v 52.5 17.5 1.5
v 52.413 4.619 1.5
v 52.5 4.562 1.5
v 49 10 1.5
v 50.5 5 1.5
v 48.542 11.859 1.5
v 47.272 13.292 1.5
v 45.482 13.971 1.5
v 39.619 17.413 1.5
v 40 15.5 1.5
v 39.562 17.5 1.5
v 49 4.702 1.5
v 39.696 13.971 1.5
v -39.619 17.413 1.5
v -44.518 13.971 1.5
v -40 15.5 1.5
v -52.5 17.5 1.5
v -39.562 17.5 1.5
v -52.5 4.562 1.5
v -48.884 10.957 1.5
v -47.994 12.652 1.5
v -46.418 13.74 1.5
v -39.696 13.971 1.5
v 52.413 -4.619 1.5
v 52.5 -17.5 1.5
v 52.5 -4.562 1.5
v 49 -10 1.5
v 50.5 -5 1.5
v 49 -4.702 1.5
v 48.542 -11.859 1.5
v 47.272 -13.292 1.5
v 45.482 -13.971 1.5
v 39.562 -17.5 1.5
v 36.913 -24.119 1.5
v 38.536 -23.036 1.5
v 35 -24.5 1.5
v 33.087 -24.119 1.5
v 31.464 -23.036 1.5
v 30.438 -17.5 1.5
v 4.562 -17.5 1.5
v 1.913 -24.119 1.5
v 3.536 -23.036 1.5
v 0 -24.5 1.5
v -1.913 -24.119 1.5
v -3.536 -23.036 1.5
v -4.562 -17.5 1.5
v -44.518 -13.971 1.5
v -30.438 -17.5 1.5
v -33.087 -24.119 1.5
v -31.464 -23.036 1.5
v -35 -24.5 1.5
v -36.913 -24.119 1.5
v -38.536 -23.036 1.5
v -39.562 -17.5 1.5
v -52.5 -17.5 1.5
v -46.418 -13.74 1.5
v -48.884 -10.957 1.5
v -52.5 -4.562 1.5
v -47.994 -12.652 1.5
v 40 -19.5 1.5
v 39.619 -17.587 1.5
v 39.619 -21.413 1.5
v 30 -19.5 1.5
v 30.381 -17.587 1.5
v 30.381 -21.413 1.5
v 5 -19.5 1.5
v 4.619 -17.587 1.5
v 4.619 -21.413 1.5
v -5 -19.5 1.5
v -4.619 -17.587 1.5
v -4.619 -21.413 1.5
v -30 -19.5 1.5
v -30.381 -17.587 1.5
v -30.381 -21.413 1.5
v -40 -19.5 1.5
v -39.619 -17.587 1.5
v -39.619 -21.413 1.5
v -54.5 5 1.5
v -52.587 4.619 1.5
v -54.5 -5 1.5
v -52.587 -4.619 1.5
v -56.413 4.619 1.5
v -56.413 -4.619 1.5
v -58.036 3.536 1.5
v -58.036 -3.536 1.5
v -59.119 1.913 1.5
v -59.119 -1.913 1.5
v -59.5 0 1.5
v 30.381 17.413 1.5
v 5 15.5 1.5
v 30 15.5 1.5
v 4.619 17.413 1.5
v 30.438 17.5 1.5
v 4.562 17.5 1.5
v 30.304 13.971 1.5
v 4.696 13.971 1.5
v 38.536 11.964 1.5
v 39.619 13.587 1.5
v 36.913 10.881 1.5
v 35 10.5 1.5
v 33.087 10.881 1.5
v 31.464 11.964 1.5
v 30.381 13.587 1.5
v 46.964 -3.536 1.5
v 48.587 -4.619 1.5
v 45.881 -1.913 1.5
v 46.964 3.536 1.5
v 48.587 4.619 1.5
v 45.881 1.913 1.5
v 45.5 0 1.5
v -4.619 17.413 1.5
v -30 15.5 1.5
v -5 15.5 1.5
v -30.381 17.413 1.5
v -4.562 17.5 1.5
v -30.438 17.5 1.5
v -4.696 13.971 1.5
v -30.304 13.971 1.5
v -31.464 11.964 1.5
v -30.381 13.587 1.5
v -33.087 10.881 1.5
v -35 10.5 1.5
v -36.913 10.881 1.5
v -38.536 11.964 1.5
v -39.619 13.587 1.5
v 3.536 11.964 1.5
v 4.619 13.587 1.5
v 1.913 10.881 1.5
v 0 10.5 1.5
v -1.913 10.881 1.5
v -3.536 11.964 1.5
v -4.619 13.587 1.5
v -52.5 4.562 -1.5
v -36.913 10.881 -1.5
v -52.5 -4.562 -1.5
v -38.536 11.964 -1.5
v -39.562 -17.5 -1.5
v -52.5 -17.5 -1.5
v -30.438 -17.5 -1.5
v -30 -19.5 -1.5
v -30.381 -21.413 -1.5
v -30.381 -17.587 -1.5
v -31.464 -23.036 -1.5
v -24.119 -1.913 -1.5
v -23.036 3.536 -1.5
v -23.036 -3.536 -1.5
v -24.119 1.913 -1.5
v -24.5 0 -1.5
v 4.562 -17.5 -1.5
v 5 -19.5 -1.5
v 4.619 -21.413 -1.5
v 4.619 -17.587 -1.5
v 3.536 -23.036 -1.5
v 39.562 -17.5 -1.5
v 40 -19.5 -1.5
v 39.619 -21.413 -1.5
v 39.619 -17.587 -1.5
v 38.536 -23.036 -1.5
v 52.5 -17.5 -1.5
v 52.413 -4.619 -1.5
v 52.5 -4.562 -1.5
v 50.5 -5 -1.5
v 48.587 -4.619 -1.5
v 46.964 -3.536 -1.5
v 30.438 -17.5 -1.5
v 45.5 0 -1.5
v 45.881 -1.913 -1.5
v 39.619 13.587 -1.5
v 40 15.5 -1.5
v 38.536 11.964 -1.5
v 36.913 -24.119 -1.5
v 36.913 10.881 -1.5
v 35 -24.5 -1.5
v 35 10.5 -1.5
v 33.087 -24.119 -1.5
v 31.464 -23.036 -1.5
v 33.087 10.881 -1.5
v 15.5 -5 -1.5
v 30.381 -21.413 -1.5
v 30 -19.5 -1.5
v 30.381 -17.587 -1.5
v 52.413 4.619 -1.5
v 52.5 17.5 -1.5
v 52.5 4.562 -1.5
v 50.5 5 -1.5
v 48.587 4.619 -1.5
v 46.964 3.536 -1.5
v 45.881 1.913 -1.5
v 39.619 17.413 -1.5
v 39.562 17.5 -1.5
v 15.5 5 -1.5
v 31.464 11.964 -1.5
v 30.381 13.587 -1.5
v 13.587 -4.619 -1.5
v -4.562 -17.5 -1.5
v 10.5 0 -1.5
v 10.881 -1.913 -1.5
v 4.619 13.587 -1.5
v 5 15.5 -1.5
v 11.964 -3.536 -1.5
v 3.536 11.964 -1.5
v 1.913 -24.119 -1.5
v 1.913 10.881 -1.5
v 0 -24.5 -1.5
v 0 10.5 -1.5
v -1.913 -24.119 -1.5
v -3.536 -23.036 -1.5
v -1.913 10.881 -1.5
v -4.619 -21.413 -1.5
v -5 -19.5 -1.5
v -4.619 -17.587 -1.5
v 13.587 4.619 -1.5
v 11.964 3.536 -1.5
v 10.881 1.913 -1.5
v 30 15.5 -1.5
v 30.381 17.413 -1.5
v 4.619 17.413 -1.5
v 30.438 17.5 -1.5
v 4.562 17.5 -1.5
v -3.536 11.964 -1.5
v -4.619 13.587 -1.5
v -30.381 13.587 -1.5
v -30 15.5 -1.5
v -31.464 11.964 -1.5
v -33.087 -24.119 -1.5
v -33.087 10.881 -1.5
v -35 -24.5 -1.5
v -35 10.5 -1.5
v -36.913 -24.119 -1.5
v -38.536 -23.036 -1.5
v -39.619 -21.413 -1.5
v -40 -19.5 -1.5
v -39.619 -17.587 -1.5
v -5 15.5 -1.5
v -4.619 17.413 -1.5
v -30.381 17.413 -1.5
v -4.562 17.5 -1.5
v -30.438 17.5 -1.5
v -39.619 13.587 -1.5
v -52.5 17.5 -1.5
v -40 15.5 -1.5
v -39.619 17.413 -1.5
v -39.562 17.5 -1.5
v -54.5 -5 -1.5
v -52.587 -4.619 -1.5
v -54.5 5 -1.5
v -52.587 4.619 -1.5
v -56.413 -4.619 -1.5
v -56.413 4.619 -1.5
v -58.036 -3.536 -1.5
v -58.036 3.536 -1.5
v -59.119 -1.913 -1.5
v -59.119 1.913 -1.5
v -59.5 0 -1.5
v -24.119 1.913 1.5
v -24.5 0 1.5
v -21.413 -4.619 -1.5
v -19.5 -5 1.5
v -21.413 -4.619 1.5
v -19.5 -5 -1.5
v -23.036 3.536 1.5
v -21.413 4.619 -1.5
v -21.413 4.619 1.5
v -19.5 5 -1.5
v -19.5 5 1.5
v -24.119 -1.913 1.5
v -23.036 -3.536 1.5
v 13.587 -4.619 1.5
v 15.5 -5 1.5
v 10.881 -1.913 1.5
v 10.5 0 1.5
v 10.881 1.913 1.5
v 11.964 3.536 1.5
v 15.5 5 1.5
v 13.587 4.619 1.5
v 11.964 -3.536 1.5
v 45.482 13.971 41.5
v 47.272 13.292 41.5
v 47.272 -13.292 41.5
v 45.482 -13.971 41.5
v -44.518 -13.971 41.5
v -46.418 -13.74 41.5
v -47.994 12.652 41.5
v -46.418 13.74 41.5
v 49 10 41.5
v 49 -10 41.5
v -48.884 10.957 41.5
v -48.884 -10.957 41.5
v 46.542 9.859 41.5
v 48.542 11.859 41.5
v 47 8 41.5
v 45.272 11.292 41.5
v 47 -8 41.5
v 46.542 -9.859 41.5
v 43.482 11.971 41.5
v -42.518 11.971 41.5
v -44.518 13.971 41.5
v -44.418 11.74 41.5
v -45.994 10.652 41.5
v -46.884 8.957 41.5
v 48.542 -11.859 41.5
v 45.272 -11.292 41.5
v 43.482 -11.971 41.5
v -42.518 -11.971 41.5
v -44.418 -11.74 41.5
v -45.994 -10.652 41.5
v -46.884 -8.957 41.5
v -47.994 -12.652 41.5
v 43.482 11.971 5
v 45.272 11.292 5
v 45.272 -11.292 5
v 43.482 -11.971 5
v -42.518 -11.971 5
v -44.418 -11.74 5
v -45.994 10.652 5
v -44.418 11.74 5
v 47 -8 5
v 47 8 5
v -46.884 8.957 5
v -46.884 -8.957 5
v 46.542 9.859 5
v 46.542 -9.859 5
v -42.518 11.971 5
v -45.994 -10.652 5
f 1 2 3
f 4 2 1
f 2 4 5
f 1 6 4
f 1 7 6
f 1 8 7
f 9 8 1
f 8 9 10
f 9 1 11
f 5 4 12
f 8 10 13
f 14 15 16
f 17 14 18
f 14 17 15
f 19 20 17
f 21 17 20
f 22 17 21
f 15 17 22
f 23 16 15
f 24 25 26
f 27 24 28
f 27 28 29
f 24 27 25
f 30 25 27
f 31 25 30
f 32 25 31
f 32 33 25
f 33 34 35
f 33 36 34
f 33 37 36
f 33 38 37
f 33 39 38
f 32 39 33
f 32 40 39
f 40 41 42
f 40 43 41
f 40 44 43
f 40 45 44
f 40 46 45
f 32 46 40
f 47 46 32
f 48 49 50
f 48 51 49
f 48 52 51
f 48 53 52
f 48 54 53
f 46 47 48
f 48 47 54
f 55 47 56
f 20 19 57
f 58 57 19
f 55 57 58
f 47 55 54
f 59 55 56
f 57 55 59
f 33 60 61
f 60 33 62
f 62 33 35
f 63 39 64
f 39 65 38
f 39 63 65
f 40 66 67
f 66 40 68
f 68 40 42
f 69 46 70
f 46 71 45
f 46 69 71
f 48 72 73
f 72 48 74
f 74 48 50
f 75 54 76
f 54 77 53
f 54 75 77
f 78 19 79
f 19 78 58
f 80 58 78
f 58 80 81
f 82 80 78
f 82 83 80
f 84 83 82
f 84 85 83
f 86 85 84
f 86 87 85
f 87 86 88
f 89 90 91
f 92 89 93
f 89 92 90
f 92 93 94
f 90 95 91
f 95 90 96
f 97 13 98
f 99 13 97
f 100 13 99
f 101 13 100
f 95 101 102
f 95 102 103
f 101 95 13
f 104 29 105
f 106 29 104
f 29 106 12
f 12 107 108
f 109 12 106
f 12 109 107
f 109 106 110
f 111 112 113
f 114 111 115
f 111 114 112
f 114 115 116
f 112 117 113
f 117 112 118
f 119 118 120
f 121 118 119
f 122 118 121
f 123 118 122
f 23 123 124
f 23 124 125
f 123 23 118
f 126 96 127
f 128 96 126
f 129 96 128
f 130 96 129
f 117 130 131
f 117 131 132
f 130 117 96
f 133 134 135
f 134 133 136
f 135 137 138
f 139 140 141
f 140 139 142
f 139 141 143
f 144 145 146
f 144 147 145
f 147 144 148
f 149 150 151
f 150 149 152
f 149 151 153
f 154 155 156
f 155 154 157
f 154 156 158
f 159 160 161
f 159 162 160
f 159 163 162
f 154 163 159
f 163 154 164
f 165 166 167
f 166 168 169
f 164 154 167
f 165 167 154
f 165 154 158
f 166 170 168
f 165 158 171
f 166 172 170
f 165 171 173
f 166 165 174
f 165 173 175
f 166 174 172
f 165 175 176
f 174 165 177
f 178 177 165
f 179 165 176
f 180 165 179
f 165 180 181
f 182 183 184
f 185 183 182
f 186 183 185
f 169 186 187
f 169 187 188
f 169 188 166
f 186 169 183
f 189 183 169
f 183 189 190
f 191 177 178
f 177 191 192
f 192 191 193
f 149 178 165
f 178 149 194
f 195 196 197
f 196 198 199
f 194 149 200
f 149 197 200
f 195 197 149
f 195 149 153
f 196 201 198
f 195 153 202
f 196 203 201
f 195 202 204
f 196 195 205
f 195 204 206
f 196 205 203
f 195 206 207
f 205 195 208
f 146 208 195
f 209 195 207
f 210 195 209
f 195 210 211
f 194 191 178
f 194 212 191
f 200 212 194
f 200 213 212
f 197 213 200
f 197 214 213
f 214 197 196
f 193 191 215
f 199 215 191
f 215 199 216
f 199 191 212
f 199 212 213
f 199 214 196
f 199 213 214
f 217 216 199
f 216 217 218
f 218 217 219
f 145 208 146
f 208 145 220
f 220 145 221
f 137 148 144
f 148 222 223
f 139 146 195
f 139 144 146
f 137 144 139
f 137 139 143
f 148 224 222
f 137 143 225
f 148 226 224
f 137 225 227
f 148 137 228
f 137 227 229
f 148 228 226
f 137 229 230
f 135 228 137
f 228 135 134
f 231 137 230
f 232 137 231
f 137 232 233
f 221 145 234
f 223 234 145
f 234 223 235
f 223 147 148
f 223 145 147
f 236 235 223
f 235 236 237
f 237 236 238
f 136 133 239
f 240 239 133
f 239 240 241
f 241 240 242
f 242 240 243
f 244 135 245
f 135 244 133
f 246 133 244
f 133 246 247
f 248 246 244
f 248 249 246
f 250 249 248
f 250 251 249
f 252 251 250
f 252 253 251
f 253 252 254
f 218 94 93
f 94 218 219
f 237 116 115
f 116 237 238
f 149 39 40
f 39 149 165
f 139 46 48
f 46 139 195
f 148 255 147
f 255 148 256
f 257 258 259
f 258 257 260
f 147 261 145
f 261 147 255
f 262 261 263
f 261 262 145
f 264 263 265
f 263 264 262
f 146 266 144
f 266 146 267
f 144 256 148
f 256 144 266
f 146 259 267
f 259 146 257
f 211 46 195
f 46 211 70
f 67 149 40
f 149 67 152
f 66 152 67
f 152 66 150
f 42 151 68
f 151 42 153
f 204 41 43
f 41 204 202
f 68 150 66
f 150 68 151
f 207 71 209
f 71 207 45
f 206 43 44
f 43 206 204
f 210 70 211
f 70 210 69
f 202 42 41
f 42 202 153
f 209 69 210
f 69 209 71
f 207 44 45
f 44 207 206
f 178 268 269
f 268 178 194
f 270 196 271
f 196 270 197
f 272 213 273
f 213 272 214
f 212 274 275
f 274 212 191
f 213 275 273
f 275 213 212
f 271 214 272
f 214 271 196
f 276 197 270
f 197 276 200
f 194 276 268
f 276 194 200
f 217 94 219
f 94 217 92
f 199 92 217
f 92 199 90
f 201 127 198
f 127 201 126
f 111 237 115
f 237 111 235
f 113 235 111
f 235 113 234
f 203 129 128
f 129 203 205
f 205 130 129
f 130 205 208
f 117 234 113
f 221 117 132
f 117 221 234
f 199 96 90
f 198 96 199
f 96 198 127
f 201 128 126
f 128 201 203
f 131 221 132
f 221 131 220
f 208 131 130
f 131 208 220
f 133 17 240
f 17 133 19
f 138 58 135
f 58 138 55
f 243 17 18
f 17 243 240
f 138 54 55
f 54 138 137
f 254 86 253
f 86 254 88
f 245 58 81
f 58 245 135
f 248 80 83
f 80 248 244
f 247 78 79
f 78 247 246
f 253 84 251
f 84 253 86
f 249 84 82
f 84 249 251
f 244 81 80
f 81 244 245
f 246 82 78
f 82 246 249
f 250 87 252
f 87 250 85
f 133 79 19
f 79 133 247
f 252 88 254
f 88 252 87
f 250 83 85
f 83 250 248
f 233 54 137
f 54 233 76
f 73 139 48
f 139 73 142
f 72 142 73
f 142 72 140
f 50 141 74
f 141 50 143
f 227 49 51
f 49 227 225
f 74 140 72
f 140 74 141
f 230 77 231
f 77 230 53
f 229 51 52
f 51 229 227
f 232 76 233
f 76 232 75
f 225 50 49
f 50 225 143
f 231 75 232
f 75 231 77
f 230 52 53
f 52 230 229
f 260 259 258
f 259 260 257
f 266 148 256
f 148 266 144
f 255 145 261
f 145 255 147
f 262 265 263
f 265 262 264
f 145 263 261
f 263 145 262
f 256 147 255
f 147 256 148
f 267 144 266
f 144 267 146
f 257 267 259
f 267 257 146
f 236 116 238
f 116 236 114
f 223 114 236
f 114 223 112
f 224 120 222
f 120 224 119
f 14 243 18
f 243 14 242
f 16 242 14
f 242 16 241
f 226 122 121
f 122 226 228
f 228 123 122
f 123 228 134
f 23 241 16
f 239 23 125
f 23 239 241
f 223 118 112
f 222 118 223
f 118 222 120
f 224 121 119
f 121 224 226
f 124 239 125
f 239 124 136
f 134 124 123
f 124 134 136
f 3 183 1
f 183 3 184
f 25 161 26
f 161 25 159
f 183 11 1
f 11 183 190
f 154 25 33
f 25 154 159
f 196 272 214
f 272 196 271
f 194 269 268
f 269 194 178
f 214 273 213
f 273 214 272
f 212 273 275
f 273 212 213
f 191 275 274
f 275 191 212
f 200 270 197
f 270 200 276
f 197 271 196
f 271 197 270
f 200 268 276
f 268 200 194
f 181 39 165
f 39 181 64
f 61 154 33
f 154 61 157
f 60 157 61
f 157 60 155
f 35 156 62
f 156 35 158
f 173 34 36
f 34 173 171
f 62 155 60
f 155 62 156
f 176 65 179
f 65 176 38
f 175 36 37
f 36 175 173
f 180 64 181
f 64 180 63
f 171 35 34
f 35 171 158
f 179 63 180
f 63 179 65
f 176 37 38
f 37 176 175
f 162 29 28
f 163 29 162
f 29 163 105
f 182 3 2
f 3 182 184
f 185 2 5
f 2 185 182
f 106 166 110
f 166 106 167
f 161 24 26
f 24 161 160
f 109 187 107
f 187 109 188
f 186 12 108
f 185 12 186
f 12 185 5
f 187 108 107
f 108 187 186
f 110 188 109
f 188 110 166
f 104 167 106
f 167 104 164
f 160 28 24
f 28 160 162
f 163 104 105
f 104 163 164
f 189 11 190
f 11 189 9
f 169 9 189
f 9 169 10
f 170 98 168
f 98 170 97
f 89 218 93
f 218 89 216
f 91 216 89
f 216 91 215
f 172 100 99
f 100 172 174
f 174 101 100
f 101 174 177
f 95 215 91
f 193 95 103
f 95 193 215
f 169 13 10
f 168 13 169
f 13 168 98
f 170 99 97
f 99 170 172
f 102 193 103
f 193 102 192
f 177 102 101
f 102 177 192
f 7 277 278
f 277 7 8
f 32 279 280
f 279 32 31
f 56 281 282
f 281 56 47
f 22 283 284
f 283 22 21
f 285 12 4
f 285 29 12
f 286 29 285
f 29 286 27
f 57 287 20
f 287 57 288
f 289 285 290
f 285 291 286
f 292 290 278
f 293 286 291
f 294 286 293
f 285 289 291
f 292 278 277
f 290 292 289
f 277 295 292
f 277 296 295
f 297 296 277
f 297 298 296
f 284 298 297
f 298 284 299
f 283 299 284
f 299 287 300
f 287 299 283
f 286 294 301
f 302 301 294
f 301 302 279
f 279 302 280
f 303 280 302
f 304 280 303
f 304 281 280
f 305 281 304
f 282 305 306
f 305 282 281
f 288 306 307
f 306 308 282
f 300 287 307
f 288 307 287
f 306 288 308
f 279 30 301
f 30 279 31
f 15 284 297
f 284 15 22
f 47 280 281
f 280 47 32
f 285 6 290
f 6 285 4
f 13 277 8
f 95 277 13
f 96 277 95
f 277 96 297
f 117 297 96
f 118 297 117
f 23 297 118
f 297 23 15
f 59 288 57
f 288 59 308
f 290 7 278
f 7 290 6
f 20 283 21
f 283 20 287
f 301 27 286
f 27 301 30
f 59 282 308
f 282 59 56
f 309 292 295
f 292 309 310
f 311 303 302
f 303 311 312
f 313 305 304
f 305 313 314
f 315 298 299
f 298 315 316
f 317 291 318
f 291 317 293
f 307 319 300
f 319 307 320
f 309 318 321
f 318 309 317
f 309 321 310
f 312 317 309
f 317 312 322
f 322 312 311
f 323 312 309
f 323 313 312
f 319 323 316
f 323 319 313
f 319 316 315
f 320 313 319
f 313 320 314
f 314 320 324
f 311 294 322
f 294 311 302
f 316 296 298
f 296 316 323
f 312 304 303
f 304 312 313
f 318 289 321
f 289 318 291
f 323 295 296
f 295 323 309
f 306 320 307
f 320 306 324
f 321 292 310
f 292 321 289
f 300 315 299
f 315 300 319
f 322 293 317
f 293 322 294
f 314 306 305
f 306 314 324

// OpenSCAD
// file: base.scad
//$fa=5; $fs=0.1;

// стыкабельное основание
module base(){
	difference(){
		union(){
			cube([35,35,3], center=true);	 // база
			translate([0, 0, 3]) cylinder(h=3, r=10, center=true);
			translate([-19.5, 0, 0]) cylinder(h=3, r=5, center=true); // выступы
			translate([0, -19.5, 0]) cylinder(h=3, r=5, center=true);
		}

		union(){
			translate([15.5, 0, 0]) cylinder(h=3.2, r=5, center=true); // прорези
			translate([0, 15.5, 0]) cylinder(h=3.2, r=5, center=true);
		}
	}
}

base();
// main file
//$fa=5; $fs=0.1;

use<base.scad>;

module note_paper_3seg(){

	translate([-35,0,0]) base();
	base();
	translate([35,0,0]) base();
	
	
	difference(){
	
		hull(){
			translate([-45,10, 21.5]) cylinder(h=40, r=4, center=true);
			translate([-45,-10, 21.5])cylinder(h=40, r=4, center=true);
			translate([45,10, 21.5]) cylinder(h=40, r=4, center=true);
			translate([45,-10, 21.5]) cylinder(h=40, r=4, center=true);
		}
		
		hull(){
			translate([-43,8, 25]) cylinder(h=40, r=4, center=true);
			translate([-43,-8, 25])cylinder(h=40, r=4, center=true);
			translate([43,8, 25]) cylinder(h=40, r=4, center=true);
			translate([43,-8, 25]) cylinder(h=40, r=4, center=true);
		}
	
	}

}

note_paper_3seg();
